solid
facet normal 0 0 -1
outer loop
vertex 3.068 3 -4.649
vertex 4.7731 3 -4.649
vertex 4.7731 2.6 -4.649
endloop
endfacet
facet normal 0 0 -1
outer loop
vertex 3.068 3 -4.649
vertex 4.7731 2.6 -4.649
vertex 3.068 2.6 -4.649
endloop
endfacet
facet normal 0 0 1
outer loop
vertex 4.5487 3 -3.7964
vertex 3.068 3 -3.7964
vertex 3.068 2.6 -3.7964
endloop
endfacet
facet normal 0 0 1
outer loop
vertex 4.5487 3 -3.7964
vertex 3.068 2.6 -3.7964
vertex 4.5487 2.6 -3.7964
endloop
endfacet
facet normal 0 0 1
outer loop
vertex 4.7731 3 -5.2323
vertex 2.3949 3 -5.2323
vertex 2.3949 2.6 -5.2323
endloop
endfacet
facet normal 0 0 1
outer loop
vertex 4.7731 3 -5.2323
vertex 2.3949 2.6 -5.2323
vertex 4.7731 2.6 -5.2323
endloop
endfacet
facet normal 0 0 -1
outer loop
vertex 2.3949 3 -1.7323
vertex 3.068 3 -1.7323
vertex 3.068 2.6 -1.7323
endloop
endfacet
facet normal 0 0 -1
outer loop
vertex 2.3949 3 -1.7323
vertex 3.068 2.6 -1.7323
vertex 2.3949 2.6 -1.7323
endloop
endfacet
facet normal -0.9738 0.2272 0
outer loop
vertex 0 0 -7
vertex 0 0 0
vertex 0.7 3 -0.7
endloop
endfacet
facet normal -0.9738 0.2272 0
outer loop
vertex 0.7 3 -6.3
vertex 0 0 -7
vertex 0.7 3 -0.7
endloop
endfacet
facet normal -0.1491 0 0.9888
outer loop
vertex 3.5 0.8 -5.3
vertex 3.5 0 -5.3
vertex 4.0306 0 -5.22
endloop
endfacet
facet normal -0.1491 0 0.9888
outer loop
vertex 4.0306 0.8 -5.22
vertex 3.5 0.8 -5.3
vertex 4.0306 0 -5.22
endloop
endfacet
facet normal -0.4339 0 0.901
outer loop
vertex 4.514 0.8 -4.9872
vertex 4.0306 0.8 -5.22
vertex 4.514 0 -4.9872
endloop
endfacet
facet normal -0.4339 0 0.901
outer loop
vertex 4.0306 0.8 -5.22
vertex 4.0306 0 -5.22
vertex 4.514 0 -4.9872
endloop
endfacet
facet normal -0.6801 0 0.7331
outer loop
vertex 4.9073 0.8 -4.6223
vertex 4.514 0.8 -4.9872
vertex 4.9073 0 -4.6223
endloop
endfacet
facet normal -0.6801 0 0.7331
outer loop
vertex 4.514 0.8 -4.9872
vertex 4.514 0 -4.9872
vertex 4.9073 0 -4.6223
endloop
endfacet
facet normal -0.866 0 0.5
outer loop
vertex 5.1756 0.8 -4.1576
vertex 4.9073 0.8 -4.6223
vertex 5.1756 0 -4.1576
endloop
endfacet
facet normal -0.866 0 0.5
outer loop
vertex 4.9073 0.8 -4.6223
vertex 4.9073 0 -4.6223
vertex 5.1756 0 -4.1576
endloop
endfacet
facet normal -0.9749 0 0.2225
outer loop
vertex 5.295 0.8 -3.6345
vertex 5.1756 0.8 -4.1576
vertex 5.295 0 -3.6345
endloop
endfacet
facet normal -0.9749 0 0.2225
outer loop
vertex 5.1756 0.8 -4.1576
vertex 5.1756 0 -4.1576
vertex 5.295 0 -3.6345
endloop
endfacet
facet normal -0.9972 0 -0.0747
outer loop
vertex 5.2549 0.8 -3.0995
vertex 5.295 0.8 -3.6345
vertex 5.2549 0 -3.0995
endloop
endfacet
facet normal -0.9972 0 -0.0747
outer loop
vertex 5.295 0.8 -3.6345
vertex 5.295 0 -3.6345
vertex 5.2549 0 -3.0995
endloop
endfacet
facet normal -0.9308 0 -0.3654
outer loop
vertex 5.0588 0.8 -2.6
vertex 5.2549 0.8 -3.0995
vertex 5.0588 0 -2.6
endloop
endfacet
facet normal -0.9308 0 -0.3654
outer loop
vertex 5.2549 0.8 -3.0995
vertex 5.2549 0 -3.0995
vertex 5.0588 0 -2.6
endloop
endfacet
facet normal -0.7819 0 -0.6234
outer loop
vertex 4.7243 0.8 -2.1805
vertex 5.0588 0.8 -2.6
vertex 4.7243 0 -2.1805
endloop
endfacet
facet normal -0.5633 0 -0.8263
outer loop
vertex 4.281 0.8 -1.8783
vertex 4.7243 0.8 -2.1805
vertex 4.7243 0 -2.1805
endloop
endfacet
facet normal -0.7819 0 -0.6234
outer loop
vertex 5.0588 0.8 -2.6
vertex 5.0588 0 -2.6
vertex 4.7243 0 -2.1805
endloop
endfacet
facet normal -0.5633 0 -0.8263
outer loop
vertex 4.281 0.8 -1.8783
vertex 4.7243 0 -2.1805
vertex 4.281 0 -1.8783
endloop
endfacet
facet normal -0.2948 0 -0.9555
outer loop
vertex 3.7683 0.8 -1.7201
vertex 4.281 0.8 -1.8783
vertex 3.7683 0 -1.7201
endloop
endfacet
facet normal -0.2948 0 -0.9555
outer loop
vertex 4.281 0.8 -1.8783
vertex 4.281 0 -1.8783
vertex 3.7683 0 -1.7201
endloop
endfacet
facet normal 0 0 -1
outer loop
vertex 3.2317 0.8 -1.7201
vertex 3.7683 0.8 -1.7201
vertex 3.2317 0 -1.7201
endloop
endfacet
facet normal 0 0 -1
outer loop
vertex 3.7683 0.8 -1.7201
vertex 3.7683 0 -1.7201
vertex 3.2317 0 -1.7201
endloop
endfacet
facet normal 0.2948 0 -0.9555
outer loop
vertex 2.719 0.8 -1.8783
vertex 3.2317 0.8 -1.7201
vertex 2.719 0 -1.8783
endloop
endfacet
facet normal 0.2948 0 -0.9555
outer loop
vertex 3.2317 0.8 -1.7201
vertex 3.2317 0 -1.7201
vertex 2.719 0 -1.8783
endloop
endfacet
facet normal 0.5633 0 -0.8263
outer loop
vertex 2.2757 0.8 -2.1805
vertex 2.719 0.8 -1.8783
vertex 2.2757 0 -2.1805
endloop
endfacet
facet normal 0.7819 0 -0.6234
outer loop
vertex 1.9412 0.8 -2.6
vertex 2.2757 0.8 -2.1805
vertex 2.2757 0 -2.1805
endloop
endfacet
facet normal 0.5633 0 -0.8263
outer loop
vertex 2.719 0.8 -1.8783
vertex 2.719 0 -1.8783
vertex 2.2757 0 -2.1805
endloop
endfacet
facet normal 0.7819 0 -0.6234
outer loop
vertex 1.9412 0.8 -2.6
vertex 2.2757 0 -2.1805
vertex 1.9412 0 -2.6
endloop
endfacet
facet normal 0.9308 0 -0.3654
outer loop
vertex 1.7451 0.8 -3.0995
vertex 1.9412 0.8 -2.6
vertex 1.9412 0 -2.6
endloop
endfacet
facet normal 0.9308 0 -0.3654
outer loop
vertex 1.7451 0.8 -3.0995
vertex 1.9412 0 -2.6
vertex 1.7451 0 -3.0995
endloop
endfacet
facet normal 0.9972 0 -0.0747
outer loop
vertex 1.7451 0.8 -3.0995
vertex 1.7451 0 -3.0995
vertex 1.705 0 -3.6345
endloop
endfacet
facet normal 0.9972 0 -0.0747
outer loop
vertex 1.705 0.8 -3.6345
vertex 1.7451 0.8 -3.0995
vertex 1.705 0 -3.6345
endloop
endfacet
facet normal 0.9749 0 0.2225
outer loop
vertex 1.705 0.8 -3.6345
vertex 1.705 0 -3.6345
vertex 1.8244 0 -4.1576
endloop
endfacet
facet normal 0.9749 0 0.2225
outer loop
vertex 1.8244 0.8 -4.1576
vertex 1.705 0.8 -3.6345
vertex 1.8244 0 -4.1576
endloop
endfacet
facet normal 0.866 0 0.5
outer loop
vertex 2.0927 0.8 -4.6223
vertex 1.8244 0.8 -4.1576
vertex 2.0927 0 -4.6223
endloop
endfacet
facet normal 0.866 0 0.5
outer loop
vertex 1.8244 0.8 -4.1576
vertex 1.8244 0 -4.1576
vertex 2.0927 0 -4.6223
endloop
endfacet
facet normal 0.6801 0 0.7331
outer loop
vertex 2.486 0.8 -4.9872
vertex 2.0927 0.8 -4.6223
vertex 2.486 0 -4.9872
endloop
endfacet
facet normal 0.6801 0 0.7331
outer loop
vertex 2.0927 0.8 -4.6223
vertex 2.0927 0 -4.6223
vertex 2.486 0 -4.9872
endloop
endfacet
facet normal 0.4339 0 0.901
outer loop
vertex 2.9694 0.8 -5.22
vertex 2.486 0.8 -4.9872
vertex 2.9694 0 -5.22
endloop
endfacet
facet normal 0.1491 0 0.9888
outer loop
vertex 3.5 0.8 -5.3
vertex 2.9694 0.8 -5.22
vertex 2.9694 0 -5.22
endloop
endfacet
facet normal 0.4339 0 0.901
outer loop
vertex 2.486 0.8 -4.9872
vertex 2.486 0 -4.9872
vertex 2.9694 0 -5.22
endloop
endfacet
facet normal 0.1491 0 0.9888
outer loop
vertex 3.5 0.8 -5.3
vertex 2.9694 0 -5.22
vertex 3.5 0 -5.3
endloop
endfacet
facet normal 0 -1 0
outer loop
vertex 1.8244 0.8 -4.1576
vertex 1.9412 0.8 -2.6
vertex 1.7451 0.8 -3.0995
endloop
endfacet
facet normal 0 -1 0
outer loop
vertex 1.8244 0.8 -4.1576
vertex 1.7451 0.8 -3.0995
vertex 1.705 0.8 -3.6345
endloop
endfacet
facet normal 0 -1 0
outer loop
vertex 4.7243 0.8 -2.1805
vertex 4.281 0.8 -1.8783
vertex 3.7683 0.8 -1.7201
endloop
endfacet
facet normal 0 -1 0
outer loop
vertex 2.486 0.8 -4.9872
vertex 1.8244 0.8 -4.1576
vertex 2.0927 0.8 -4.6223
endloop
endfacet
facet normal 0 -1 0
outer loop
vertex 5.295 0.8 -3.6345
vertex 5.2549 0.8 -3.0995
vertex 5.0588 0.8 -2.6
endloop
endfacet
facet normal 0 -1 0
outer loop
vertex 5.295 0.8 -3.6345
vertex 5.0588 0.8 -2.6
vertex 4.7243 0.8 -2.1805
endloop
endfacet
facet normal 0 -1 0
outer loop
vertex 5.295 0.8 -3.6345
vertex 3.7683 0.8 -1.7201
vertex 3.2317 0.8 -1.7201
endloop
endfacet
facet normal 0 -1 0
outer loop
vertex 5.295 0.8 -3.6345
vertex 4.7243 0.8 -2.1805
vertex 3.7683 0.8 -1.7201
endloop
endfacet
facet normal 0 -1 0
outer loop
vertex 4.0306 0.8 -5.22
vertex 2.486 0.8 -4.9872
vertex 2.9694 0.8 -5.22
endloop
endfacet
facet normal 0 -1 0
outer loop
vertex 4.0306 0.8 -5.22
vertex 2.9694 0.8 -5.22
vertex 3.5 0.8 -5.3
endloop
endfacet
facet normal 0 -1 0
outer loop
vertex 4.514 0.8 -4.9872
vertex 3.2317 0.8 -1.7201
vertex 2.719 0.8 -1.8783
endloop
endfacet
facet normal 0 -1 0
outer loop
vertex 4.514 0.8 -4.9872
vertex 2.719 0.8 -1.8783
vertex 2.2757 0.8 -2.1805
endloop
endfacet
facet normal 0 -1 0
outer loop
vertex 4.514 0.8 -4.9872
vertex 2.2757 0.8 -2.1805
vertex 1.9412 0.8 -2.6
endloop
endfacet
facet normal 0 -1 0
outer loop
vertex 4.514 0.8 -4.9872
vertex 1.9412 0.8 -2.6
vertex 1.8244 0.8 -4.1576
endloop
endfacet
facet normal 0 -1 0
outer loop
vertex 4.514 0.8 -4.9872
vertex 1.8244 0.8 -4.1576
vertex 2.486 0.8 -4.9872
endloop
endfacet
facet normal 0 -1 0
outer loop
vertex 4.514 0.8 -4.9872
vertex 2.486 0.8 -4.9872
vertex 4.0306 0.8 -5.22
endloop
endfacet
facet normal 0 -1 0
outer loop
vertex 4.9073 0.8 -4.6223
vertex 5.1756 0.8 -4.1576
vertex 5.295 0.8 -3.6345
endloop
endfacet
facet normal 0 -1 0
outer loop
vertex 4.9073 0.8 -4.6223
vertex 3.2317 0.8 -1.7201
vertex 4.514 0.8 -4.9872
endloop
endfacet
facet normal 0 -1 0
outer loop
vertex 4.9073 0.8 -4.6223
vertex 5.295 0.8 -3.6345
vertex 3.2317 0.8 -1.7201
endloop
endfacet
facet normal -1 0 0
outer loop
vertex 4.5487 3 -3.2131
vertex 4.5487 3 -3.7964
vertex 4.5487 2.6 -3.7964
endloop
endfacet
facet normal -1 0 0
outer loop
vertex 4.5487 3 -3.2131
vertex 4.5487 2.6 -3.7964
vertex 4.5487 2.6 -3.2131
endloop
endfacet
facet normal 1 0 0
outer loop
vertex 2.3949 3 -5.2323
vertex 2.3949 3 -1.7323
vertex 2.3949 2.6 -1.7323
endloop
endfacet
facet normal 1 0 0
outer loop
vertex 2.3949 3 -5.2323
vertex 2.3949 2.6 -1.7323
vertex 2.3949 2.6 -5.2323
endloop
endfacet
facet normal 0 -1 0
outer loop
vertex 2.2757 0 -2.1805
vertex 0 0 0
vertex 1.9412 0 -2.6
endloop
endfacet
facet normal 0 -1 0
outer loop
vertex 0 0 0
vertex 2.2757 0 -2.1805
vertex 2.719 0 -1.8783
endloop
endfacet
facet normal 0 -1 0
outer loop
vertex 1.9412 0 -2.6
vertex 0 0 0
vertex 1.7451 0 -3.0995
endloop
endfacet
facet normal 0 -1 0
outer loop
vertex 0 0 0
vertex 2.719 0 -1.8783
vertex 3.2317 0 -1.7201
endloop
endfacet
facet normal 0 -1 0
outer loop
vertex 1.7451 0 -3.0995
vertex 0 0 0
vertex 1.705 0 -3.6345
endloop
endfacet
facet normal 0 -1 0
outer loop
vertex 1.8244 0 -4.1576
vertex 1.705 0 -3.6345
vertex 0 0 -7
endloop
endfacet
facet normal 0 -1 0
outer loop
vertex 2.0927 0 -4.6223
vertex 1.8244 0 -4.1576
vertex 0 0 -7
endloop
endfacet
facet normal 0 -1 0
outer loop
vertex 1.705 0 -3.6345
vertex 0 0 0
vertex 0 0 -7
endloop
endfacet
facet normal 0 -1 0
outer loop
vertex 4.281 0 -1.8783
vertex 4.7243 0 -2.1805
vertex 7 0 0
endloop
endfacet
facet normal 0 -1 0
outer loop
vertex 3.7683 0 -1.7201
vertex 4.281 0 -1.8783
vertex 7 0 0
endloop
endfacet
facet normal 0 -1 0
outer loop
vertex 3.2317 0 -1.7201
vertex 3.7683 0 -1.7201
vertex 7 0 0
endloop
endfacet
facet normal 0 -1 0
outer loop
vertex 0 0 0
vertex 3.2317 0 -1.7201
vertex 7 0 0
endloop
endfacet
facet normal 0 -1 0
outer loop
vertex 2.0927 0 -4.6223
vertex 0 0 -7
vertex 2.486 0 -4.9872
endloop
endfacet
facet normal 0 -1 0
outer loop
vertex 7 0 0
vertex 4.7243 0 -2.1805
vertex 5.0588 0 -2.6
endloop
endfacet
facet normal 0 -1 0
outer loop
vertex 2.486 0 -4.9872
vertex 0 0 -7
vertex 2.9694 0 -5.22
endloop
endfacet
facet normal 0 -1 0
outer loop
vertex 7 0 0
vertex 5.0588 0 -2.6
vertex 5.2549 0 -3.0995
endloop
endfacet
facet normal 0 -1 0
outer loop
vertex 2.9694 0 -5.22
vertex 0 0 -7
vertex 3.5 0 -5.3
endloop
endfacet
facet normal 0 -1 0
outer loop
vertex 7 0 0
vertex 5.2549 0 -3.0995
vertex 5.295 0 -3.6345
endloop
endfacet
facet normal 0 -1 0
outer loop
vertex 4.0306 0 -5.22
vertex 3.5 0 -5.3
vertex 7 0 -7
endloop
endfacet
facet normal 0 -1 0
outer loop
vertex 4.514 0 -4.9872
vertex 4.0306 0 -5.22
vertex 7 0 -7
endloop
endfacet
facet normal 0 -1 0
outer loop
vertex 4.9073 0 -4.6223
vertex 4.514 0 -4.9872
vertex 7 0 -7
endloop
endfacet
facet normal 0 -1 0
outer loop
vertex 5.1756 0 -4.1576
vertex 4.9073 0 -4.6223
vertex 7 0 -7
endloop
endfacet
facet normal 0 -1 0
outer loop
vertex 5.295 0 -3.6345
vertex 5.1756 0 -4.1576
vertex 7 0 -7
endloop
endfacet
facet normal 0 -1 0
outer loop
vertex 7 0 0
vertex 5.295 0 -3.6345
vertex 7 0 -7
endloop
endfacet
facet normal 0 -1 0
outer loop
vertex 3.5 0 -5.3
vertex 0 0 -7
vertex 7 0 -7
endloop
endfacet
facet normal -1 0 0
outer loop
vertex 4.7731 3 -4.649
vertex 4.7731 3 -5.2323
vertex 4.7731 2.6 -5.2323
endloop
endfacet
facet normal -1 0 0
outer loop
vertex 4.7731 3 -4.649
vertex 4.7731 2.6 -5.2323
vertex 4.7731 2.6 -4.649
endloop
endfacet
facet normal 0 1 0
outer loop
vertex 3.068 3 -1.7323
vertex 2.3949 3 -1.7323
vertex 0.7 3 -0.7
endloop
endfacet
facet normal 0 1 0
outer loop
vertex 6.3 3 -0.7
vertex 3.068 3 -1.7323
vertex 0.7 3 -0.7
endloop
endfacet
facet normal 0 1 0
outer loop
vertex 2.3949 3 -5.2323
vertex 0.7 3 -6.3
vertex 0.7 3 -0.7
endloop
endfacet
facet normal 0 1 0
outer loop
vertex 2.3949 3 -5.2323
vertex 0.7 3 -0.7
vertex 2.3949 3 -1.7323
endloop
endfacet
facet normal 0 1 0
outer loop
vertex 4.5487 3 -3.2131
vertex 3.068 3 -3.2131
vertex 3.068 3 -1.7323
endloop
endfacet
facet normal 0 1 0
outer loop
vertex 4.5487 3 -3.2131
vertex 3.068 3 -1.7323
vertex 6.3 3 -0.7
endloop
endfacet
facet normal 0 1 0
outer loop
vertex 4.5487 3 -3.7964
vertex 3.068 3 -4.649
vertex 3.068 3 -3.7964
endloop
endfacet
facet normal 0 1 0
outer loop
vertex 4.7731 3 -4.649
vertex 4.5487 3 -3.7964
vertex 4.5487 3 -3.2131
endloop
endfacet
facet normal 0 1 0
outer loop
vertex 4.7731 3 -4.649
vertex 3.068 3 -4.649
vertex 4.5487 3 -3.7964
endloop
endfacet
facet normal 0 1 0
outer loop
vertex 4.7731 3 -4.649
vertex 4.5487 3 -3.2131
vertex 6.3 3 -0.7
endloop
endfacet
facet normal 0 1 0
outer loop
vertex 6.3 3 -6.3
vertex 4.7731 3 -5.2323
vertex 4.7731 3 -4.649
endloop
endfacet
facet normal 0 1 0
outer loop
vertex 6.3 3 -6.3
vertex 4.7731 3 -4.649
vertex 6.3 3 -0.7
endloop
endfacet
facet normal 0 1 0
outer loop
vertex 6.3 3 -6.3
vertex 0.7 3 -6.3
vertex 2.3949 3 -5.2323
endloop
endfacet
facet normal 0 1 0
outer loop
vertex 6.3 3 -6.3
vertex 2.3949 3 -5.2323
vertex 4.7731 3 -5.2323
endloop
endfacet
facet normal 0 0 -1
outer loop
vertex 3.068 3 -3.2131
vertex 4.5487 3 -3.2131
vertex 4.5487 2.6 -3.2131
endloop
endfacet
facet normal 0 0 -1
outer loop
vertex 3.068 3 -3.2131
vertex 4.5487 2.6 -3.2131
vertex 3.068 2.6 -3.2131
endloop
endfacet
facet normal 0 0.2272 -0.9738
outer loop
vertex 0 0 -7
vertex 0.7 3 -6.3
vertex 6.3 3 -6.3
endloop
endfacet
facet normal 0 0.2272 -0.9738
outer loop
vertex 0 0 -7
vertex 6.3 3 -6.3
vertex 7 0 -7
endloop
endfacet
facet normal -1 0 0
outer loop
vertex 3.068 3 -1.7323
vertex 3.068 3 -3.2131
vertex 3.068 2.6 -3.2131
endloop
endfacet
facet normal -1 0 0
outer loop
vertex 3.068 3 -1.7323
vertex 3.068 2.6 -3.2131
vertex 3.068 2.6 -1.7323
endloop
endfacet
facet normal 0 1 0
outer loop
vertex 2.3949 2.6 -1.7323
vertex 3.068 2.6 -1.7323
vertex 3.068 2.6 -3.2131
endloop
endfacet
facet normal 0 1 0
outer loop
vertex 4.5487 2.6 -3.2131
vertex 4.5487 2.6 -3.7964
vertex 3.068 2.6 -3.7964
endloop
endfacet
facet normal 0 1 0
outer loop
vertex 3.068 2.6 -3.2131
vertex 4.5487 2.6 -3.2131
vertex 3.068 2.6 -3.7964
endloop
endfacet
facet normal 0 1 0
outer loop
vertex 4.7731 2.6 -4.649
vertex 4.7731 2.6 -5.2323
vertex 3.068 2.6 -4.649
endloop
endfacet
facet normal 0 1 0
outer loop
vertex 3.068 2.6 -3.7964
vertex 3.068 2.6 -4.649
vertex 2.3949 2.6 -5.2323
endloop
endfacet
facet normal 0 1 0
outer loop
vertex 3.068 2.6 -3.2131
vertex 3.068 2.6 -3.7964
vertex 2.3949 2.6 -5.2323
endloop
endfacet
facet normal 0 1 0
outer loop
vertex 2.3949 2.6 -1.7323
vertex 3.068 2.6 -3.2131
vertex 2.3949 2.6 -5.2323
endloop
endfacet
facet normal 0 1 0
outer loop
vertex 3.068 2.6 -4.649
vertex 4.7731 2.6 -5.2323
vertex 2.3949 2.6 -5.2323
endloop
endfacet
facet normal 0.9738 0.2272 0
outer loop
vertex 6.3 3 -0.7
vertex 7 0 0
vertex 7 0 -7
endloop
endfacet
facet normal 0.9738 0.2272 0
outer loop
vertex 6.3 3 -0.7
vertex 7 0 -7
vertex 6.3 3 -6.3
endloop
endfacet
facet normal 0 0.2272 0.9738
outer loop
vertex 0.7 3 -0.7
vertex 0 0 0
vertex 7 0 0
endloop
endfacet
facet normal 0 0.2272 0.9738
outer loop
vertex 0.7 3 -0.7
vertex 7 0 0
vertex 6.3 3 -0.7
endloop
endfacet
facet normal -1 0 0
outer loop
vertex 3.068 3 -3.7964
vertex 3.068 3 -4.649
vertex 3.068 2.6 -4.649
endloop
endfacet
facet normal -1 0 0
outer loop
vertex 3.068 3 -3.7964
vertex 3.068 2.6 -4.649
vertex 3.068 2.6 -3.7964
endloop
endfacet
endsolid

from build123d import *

# Parameters (mm, degrees)
SKETCH1_W           = 7
SKETCH1_H           = 7
BOSS_EXTRUDE1_DEPTH = 3
CUT_EXTRUDE1_DEPTH  = 7
CUT_EXTRUDE2_DEPTH  = 11
SKETCH4_R           = 1.8
CUT_EXTRUDE3_DEPTH  = 0.8
CUT_EXTRUDE4_DEPTH  = 0.4


with BuildPart() as part:
    # Sketch1 → Boss-Extrude1 (new body)
    with BuildSketch(Plane(origin=(0, 0, 0), x_dir=(1, 0, 0), z_dir=(0, 1, 0))):
        with Locations((3.5, 3.5)):
            Rectangle(SKETCH1_W, SKETCH1_H)
    extrude(amount=BOSS_EXTRUDE1_DEPTH)

    # Sketch2 → Cut-Extrude1 (cut)
    with BuildSketch(Plane.XY):
        Polygon((0, 0), (0.7, 3), (0, 3), align=None)
        Polygon((7, 0), (6.3, 3), (7, 3), align=None)
    extrude(amount=-CUT_EXTRUDE1_DEPTH, mode=Mode.SUBTRACT)

    # Sketch3 → Cut-Extrude2 (cut)
    with BuildSketch(Plane(origin=(0, 0, 0), x_dir=(0, 0, -1), z_dir=(1, 0, 0))):
        Polygon((0, 0), (0.7, 3), (0, 3), align=None)
        Polygon((7, 3), (6.3, 3), (7, 0), align=None)
    extrude(amount=CUT_EXTRUDE2_DEPTH, mode=Mode.SUBTRACT)

    # Sketch4 → Cut-Extrude3 (cut)
    with BuildSketch(Plane.XZ):
        with Locations(Location((3.5, -3.5, 0), (0, 0, 270))):
            Circle(SKETCH4_R)
    extrude(amount=-CUT_EXTRUDE3_DEPTH, mode=Mode.SUBTRACT)

    # Sketch5 → Cut-Extrude4 (cut)
    with BuildSketch(Plane(origin=(0, 3, 0), x_dir=(1, 0, 0), z_dir=(0, 1, 0))):
        Polygon((2.394882383, 1.732294481), (2.394882383, 5.232294481), (4.773087512, 5.232294481), (4.773087512, 4.648961148), (3.067959306, 4.648961148), (3.067959306, 3.796397045), (4.548728537, 3.796397045), (4.548728537, 3.213063712), (3.067959306, 3.213063712), (3.067959306, 1.732294481), align=None)
    extrude(amount=-CUT_EXTRUDE4_DEPTH, mode=Mode.SUBTRACT)


solid = part.part
